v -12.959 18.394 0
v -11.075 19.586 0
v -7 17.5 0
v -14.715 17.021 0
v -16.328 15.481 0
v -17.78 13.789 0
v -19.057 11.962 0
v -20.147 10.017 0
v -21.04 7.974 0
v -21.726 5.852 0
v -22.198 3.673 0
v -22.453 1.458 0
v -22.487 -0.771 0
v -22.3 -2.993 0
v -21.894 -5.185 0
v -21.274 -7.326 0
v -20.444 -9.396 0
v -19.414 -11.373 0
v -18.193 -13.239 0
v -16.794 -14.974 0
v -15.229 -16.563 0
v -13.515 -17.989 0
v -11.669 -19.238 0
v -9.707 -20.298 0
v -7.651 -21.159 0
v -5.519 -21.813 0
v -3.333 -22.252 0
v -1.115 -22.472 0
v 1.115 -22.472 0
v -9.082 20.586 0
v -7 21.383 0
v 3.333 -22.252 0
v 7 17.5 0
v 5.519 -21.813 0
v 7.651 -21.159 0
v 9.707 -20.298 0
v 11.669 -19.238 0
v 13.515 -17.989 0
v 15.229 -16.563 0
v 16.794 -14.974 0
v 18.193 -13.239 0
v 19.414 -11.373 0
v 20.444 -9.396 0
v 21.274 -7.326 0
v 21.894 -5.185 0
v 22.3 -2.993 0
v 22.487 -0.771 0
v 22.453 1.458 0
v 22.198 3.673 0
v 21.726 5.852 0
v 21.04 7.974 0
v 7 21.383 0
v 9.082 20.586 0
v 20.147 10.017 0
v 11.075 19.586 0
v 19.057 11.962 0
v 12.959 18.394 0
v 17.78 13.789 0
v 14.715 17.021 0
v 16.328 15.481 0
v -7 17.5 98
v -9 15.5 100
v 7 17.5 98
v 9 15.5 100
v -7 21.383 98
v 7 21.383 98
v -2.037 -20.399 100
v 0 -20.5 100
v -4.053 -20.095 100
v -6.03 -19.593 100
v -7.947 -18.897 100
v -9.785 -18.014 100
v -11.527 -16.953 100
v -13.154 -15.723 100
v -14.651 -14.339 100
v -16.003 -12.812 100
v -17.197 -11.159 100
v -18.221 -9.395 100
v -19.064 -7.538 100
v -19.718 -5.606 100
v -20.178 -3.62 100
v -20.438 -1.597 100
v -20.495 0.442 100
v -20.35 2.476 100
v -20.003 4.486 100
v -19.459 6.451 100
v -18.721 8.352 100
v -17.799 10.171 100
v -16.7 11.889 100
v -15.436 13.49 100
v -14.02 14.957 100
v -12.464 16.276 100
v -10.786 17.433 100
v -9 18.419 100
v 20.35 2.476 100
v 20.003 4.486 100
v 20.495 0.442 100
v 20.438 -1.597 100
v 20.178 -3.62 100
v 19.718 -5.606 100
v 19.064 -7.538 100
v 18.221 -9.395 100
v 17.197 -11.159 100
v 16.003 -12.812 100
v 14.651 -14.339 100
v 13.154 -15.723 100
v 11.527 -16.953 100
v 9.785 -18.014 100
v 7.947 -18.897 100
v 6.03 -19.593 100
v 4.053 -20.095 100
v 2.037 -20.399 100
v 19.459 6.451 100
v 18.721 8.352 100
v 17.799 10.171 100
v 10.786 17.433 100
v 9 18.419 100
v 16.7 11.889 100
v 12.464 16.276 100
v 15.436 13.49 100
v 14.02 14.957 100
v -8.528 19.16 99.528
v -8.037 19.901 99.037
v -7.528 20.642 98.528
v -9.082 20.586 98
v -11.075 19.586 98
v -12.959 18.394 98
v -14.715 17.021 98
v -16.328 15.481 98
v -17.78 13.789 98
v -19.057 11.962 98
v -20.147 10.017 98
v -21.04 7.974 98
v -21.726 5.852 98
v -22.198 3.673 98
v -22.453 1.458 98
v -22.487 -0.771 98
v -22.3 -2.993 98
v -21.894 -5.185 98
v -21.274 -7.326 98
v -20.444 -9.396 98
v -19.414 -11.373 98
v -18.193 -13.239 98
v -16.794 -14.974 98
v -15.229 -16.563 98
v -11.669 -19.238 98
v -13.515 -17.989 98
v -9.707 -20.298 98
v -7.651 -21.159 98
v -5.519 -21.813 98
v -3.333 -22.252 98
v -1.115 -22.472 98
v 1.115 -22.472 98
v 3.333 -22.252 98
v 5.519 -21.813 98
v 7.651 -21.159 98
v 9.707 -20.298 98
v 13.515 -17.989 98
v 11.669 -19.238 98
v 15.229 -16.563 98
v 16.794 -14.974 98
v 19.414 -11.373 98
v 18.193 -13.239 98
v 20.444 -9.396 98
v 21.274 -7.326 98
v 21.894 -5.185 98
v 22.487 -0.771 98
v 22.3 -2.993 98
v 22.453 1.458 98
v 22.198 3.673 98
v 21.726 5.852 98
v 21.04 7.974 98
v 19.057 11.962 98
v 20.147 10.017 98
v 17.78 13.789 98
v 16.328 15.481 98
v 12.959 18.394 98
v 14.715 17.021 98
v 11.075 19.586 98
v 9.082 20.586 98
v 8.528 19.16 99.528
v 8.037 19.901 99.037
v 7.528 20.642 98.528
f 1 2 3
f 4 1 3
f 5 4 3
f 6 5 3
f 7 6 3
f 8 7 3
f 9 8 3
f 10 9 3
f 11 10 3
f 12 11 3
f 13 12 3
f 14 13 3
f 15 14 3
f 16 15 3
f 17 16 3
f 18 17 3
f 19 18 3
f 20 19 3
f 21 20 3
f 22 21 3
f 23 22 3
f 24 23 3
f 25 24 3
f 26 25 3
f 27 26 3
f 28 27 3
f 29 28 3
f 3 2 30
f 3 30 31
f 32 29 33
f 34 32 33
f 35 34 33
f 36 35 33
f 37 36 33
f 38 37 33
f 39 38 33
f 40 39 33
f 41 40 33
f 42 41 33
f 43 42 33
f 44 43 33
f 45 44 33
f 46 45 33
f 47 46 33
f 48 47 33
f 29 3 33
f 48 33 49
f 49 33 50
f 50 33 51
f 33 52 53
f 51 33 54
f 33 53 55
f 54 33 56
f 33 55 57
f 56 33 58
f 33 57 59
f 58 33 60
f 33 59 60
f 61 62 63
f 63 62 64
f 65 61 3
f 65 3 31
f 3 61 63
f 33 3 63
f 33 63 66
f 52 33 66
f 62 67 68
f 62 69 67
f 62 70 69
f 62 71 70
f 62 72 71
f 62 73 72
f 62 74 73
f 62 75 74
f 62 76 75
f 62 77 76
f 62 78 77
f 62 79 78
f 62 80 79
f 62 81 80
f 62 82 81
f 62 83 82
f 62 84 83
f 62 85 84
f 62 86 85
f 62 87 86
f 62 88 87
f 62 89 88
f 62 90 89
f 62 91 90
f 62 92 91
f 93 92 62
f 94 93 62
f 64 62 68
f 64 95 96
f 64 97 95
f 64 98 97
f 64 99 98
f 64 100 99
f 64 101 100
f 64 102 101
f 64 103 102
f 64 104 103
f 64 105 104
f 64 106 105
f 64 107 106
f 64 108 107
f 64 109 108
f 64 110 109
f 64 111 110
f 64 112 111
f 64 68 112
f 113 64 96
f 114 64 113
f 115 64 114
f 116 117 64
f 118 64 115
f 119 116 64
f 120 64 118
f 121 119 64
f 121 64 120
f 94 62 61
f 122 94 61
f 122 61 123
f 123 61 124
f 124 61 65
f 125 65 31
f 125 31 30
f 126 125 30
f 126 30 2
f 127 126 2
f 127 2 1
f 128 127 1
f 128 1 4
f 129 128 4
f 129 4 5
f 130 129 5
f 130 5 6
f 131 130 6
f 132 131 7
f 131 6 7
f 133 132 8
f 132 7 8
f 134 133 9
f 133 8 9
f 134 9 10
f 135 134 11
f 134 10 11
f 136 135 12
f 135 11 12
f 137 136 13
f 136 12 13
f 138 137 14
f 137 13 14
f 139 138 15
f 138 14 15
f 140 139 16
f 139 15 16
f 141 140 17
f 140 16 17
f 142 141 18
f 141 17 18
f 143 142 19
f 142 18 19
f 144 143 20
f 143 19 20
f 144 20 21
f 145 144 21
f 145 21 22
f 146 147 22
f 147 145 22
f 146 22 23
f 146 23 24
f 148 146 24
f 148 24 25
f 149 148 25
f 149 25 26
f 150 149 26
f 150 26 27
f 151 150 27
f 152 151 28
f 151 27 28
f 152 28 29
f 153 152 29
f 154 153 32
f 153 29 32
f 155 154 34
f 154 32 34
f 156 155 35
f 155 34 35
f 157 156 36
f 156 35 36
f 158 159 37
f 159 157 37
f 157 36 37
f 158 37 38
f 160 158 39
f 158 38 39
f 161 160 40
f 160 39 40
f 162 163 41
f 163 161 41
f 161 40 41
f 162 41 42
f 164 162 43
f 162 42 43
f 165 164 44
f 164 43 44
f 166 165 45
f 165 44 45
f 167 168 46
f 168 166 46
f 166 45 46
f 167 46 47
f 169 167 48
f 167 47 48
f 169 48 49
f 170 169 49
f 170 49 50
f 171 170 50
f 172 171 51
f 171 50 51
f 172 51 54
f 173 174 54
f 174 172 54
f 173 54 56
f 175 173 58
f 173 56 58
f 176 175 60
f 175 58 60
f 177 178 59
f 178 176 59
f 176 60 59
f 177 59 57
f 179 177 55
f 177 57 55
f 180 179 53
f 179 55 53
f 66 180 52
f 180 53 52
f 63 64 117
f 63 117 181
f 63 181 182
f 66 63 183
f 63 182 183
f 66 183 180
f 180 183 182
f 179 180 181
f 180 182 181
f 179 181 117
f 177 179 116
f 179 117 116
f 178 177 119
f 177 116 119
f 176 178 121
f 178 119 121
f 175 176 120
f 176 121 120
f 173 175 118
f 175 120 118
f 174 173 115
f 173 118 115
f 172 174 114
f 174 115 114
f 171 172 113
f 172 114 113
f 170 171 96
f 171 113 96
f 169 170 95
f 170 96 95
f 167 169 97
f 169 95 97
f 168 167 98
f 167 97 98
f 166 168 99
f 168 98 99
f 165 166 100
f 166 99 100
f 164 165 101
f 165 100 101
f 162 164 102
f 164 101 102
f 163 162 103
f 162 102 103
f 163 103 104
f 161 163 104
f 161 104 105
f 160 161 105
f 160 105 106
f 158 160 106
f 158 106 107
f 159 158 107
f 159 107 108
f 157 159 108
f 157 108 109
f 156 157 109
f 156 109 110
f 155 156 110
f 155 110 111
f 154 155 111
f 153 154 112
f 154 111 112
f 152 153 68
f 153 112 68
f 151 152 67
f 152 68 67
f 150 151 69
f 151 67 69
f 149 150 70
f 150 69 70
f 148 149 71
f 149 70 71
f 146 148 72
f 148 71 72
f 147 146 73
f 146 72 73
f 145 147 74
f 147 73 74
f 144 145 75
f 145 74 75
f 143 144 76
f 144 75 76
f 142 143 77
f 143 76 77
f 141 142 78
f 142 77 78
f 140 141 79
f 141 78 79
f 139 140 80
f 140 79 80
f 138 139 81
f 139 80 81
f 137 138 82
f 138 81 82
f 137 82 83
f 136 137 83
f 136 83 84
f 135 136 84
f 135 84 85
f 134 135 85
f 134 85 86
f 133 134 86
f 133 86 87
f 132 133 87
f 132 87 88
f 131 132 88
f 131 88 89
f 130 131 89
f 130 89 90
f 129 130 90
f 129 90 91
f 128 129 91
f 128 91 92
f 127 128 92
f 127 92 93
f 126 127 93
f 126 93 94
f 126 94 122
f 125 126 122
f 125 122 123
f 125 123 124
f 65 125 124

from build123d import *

# Parameters (mm, degrees)
SKETCH1_R           = 22.5
BOSS_EXTRUDE1_DEPTH = 100
SKETCH2_W           = 14
SKETCH2_H           = 8.804237579
CUT_EXTRUDE1_DEPTH  = 105.940459309
CHAMFER1_SIZE       = 2


with BuildPart() as part:
    # Sketch1 → Boss-Extrude1 (new body)
    with BuildSketch(Plane.XY):
        Circle(SKETCH1_R)
    extrude(amount=BOSS_EXTRUDE1_DEPTH)

    # Sketch2 → Cut-Extrude1 (cut, through all)
    with BuildSketch(Plane.XY.offset(100)):
        with Locations((0, 21.90211879)):
            Rectangle(SKETCH2_W, SKETCH2_H)
    extrude(amount=-CUT_EXTRUDE1_DEPTH, mode=Mode.SUBTRACT)

    # Chamfer1
    chamfer1_edges = [part.edges().sort_by_distance(p)[0] for p in [
        (7, 19.44170239, 100),
        (-7, 19.44170239, 100),
        (0, 17.5, 100),
        (0, -22.5, 100),
    ]]
    chamfer(chamfer1_edges, length=CHAMFER1_SIZE)


solid = part.part
